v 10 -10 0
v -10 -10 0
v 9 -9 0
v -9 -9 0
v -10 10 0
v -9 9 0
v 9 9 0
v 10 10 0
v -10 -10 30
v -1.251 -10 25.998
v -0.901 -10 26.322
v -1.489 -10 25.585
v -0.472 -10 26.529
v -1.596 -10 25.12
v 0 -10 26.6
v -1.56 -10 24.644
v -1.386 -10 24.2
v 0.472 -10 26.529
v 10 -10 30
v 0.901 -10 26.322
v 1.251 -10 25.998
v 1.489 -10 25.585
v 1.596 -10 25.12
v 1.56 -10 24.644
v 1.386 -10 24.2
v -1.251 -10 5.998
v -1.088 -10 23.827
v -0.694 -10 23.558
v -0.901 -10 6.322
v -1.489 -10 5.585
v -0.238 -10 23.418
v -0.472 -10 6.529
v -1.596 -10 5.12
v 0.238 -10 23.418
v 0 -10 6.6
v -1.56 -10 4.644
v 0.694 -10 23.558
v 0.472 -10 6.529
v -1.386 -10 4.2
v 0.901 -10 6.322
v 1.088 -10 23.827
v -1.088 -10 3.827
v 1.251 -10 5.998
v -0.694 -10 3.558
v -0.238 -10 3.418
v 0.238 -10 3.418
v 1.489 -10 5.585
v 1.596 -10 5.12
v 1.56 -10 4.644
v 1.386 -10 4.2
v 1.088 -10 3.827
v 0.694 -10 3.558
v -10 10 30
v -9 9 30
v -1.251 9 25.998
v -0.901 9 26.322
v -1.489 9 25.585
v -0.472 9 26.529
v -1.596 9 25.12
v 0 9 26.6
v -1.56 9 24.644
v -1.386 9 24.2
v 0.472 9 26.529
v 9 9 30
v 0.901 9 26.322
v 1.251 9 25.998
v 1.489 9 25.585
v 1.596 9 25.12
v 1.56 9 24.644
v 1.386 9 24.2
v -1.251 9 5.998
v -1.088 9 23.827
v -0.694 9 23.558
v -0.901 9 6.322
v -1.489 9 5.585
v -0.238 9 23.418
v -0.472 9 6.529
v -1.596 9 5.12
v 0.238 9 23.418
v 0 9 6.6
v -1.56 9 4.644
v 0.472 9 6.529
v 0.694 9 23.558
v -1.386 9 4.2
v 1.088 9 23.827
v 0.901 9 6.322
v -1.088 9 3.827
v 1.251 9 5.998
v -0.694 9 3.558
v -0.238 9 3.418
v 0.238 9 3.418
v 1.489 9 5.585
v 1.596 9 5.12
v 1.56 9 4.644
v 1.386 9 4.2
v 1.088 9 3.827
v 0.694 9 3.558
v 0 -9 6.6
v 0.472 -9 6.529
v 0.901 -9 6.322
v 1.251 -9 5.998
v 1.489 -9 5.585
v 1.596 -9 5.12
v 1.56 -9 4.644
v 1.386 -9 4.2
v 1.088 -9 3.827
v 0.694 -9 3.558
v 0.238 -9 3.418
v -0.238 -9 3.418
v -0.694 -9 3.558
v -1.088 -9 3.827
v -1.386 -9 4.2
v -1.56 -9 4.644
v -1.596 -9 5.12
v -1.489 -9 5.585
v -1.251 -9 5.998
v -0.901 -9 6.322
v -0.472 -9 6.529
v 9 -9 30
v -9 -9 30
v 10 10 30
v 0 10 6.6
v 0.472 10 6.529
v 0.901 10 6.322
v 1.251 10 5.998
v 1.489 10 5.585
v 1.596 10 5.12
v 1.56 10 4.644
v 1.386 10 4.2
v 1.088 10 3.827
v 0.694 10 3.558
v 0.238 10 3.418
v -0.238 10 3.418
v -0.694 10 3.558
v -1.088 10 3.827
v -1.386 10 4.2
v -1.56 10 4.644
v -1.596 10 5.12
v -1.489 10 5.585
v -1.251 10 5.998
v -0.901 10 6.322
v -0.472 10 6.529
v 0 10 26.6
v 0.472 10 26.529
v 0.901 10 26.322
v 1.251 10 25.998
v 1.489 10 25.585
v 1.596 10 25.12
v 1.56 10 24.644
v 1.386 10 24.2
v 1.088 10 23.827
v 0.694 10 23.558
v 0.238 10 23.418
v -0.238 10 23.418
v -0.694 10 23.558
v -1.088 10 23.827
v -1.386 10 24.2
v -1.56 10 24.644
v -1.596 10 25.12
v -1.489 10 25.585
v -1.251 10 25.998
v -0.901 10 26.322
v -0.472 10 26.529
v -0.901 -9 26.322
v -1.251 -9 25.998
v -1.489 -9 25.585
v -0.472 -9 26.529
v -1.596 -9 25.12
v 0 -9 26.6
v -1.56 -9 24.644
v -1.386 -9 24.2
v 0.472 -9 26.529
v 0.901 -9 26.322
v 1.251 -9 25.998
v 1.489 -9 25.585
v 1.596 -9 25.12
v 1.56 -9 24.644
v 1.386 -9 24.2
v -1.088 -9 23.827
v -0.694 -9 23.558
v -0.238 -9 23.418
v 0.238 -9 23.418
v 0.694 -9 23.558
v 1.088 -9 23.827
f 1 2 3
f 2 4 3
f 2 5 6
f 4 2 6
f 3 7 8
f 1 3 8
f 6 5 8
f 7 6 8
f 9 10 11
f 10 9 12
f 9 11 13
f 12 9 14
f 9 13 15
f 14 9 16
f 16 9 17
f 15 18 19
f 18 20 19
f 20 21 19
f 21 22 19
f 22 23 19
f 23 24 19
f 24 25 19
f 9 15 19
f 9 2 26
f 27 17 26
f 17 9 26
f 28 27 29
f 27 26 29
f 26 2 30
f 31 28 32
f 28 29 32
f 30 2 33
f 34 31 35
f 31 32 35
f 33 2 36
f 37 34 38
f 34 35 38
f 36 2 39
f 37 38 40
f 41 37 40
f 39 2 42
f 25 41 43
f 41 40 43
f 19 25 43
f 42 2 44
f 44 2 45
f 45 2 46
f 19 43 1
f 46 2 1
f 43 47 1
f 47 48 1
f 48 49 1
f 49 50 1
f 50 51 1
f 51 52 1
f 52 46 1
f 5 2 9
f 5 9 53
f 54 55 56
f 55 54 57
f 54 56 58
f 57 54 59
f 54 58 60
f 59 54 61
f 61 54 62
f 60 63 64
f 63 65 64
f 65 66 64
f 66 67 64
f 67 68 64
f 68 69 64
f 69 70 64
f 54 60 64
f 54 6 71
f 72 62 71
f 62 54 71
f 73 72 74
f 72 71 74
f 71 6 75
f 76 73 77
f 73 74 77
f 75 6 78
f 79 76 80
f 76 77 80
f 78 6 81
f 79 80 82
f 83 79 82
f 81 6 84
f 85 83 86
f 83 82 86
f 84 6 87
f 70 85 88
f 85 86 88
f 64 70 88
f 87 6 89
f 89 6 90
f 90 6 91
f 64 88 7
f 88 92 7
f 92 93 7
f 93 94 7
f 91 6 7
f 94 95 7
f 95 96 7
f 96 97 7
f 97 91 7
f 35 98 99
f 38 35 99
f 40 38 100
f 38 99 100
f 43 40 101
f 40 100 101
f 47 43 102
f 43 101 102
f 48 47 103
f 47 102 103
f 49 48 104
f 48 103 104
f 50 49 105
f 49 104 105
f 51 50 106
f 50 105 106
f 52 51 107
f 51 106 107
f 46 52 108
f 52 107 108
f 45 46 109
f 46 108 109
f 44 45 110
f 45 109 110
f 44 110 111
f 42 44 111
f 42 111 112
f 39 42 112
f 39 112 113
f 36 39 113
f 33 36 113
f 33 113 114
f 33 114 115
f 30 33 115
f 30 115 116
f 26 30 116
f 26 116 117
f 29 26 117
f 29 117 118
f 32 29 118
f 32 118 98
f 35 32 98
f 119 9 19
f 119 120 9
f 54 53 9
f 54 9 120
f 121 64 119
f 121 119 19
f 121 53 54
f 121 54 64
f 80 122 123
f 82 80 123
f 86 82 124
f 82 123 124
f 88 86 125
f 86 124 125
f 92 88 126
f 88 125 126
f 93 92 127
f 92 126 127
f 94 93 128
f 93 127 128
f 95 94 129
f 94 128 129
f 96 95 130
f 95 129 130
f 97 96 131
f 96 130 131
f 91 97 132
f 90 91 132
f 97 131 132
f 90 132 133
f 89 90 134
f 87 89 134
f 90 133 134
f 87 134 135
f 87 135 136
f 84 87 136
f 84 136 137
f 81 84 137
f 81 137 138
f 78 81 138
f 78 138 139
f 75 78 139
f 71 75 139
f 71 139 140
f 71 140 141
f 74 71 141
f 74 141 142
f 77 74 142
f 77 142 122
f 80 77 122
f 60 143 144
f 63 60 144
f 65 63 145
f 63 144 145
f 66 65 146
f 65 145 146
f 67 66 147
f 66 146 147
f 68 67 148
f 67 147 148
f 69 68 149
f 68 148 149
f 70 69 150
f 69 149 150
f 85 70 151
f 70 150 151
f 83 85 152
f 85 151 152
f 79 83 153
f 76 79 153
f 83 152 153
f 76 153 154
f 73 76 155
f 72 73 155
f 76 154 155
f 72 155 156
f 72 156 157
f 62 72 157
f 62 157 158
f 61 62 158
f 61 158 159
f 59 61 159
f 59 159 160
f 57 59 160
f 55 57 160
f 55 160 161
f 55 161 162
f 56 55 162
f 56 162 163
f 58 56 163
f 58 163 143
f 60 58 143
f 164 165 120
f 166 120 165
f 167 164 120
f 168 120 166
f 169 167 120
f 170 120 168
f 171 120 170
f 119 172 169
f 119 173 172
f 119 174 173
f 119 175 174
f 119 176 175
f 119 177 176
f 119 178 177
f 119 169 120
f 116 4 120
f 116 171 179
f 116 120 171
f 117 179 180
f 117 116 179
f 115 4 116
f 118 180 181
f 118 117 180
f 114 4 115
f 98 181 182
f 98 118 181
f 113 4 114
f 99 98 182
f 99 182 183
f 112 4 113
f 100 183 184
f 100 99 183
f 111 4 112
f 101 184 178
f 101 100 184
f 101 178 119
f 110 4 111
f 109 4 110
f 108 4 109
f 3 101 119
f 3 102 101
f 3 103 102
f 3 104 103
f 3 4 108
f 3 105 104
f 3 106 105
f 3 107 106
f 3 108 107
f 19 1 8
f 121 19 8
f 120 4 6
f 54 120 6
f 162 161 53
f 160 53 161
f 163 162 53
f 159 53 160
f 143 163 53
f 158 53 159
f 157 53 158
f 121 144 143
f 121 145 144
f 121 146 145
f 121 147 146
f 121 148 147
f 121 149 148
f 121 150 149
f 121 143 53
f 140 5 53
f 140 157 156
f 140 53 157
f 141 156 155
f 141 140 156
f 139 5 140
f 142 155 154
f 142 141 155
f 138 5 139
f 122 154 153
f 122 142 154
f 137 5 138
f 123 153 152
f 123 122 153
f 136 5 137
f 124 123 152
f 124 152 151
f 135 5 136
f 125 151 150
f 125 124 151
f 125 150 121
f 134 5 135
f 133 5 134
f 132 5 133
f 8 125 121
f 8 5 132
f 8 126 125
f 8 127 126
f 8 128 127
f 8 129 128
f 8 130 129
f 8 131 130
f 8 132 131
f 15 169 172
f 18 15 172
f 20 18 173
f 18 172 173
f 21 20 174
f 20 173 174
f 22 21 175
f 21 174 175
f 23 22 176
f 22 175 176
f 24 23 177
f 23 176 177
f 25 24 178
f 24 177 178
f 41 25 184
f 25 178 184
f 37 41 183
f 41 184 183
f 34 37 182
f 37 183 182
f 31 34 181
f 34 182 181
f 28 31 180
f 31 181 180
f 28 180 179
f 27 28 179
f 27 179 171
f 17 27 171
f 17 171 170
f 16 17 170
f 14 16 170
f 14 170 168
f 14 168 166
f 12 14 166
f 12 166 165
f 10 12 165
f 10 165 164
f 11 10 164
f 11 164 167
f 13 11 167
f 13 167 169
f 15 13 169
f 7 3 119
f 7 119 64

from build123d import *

# Parameters (mm, degrees)
SKETCH_1_W          = 20
SKETCH_1_H          = 20
SKETCH_1_W_2        = 18
SKETCH_1_H_2        = 18
EXTRUDE_1_DEPTH     = 30
SKETCH_2_R          = 1.6
CUT_EXTRUDE_1_DEPTH = 50


with BuildPart() as part:
    # 草图1 → 凸台-拉伸1 (new body)
    with BuildSketch(Plane.XY):
        Rectangle(SKETCH_1_W, SKETCH_1_H)
        Rectangle(SKETCH_1_W_2, SKETCH_1_H_2, mode=Mode.SUBTRACT)
    extrude(amount=EXTRUDE_1_DEPTH)

    # 草图2 → 切除-拉伸1 (cut)
    with BuildSketch(Plane(origin=(0, 10, 0), x_dir=(1, 0, 0), z_dir=(0, 1, 0))):
        with Locations(Location((0, -5, 0), (0, 0, 270))):
            Circle(SKETCH_2_R)
        with Locations(Location((0, -25, 0), (0, 0, 270))):
            Circle(SKETCH_2_R)
    extrude(amount=-CUT_EXTRUDE_1_DEPTH, mode=Mode.SUBTRACT)


solid = part.part
